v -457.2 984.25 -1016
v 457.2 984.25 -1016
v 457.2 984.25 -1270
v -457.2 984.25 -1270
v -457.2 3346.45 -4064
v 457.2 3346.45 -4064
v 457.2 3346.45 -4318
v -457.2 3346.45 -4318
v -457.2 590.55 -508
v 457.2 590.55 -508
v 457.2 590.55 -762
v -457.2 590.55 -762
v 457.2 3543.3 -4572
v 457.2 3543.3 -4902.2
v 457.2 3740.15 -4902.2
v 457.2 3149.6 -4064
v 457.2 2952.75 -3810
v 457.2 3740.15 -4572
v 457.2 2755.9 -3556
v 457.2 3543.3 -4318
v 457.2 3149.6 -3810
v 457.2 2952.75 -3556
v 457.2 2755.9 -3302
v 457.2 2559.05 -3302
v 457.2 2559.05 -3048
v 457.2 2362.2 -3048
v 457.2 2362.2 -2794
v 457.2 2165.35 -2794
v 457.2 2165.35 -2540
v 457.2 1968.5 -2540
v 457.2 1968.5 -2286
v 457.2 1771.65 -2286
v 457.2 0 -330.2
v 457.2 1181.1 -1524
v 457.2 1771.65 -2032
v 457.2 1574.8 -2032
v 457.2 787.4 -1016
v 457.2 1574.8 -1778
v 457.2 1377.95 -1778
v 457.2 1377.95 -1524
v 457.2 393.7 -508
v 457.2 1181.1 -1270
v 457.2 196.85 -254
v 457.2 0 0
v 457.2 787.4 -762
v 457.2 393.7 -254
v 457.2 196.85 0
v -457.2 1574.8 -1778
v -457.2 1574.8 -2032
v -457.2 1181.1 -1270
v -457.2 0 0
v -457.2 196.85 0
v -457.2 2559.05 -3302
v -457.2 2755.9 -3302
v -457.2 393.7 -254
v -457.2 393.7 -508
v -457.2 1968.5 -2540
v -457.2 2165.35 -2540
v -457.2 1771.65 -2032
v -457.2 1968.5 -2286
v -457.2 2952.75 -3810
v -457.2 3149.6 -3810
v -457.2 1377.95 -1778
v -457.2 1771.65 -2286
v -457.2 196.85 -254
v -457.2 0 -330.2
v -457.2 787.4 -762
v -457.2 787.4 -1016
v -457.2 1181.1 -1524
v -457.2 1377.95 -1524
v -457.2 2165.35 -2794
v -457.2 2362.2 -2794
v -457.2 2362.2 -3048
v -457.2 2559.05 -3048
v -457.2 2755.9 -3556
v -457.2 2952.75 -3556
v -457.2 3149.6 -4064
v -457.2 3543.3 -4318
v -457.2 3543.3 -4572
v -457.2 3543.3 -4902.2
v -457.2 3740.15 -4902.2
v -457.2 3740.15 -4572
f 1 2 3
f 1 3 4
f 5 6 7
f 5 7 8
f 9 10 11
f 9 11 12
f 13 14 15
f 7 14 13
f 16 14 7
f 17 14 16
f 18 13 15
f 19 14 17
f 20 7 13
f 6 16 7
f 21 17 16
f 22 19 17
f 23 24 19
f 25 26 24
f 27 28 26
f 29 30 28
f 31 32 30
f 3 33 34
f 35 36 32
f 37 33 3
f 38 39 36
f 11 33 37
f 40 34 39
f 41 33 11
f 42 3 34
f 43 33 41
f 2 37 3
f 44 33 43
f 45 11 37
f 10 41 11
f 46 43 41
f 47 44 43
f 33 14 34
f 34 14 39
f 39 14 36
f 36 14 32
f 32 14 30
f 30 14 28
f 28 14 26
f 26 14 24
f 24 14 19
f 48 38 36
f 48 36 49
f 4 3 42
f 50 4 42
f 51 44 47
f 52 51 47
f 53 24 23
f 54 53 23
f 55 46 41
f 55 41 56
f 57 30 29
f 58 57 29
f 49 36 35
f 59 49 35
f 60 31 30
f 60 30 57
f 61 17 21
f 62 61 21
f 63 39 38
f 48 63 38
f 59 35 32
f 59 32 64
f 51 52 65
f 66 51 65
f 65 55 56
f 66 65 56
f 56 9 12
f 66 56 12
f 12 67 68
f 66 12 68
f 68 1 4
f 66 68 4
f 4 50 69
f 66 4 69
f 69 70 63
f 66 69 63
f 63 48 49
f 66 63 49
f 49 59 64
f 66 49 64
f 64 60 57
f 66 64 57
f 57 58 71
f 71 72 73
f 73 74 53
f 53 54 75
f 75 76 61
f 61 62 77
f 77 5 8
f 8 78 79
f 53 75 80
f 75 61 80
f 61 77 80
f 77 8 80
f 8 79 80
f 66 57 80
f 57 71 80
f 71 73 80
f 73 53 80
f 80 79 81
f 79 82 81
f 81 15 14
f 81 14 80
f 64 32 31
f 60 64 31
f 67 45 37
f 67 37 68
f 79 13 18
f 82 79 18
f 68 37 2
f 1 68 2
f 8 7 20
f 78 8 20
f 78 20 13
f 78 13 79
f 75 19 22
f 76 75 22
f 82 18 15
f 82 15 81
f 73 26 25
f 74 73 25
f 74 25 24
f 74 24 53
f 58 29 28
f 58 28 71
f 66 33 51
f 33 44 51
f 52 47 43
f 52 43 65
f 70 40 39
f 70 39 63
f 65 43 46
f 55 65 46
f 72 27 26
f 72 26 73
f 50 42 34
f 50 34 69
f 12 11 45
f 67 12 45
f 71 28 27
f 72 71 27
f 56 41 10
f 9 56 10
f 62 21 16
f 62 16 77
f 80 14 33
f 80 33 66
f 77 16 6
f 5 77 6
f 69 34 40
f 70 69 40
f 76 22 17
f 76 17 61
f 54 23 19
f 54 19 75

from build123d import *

# Parameters (mm, degrees)
SKETCH1_W                  = 254
SKETCH1_H                  = 196.85
MODELSTEP_DEPTH            = 457.2
SKETCH4_W                  = 914.4
SKETCH4_H                  = 196.85
EXTRUDEMAXSTAIRWIDTH_DEPTH = 76.2
PATTERN_STAIRS_COUNT       = 19
PATTERN_STAIRS_PITCH       = 321.350155594
COMBINESTAIRS_START        = -155.593203
SKETCH5_W                  = 914.4
SKETCH5_H                  = 5784.302800684
COMBINESTAIRS_DEPTH        = 155.593203


with BuildPart() as part:
    # Sketch1 → ModelStep (new body, symmetric)
    with BuildSketch(Plane(origin=(0, 0, 0), x_dir=(0, 0, -1), z_dir=(1, 0, 0))):
        with Locations((127, 98.425)):
            Rectangle(SKETCH1_W, SKETCH1_H)
    extrude(amount=MODELSTEP_DEPTH, both=True)

    # Sketch4 → ExtrudeMaxStairWidth (add)
    with BuildSketch(Plane(origin=(0, 0, -254), x_dir=(-1, 0, 0), z_dir=(0, 0, -1))):
        with Locations((0, 98.425)):
            Rectangle(SKETCH4_W, SKETCH4_H)
    extrude(amount=EXTRUDEMAXSTAIRWIDTH_DEPTH)


with BuildPart() as pattern_stairs_1:
    # Pattern stairs: pattern copy
    add(part.part.moved(Location(Vector(0, 0.612571665, -0.790415052) * (1 * PATTERN_STAIRS_PITCH))))


with BuildPart() as pattern_stairs_2:
    # Pattern stairs: pattern copy
    add(part.part.moved(Location(Vector(0, 0.612571665, -0.790415052) * (2 * PATTERN_STAIRS_PITCH))))


with BuildPart() as pattern_stairs_3:
    # Pattern stairs: pattern copy
    add(part.part.moved(Location(Vector(0, 0.612571665, -0.790415052) * (3 * PATTERN_STAIRS_PITCH))))


with BuildPart() as pattern_stairs_4:
    # Pattern stairs: pattern copy
    add(part.part.moved(Location(Vector(0, 0.612571665, -0.790415052) * (4 * PATTERN_STAIRS_PITCH))))


with BuildPart() as pattern_stairs_5:
    # Pattern stairs: pattern copy
    add(part.part.moved(Location(Vector(0, 0.612571665, -0.790415052) * (5 * PATTERN_STAIRS_PITCH))))


with BuildPart() as pattern_stairs_6:
    # Pattern stairs: pattern copy
    add(part.part.moved(Location(Vector(0, 0.612571665, -0.790415052) * (6 * PATTERN_STAIRS_PITCH))))


with BuildPart() as pattern_stairs_7:
    # Pattern stairs: pattern copy
    add(part.part.moved(Location(Vector(0, 0.612571665, -0.790415052) * (7 * PATTERN_STAIRS_PITCH))))


with BuildPart() as pattern_stairs_8:
    # Pattern stairs: pattern copy
    add(part.part.moved(Location(Vector(0, 0.612571665, -0.790415052) * (8 * PATTERN_STAIRS_PITCH))))


with BuildPart() as pattern_stairs_9:
    # Pattern stairs: pattern copy
    add(part.part.moved(Location(Vector(0, 0.612571665, -0.790415052) * (9 * PATTERN_STAIRS_PITCH))))


with BuildPart() as pattern_stairs_10:
    # Pattern stairs: pattern copy
    add(part.part.moved(Location(Vector(0, 0.612571665, -0.790415052) * (10 * PATTERN_STAIRS_PITCH))))


with BuildPart() as pattern_stairs_11:
    # Pattern stairs: pattern copy
    add(part.part.moved(Location(Vector(0, 0.612571665, -0.790415052) * (11 * PATTERN_STAIRS_PITCH))))


with BuildPart() as pattern_stairs_12:
    # Pattern stairs: pattern copy
    add(part.part.moved(Location(Vector(0, 0.612571665, -0.790415052) * (12 * PATTERN_STAIRS_PITCH))))


with BuildPart() as pattern_stairs_13:
    # Pattern stairs: pattern copy
    add(part.part.moved(Location(Vector(0, 0.612571665, -0.790415052) * (13 * PATTERN_STAIRS_PITCH))))


with BuildPart() as pattern_stairs_14:
    # Pattern stairs: pattern copy
    add(part.part.moved(Location(Vector(0, 0.612571665, -0.790415052) * (14 * PATTERN_STAIRS_PITCH))))


with BuildPart() as pattern_stairs_15:
    # Pattern stairs: pattern copy
    add(part.part.moved(Location(Vector(0, 0.612571665, -0.790415052) * (15 * PATTERN_STAIRS_PITCH))))


with BuildPart() as pattern_stairs_16:
    # Pattern stairs: pattern copy
    add(part.part.moved(Location(Vector(0, 0.612571665, -0.790415052) * (16 * PATTERN_STAIRS_PITCH))))


with BuildPart() as pattern_stairs_17:
    # Pattern stairs: pattern copy
    add(part.part.moved(Location(Vector(0, 0.612571665, -0.790415052) * (17 * PATTERN_STAIRS_PITCH))))


with BuildPart() as pattern_stairs_18:
    # Pattern stairs: pattern copy
    add(part.part.moved(Location(Vector(0, 0.612571665, -0.790415052) * (18 * PATTERN_STAIRS_PITCH))))


with BuildPart() as part_1:
    add(part.part)

    add(pattern_stairs_1.part)  # CombineStairs merges Pattern stairs_1

    add(pattern_stairs_2.part)  # CombineStairs merges Pattern stairs_2

    add(pattern_stairs_3.part)  # CombineStairs merges Pattern stairs_3

    add(pattern_stairs_4.part)  # CombineStairs merges Pattern stairs_4

    add(pattern_stairs_5.part)  # CombineStairs merges Pattern stairs_5

    add(pattern_stairs_6.part)  # CombineStairs merges Pattern stairs_6

    add(pattern_stairs_7.part)  # CombineStairs merges Pattern stairs_7

    add(pattern_stairs_8.part)  # CombineStairs merges Pattern stairs_8

    add(pattern_stairs_9.part)  # CombineStairs merges Pattern stairs_9

    add(pattern_stairs_10.part)  # CombineStairs merges Pattern stairs_10

    add(pattern_stairs_11.part)  # CombineStairs merges Pattern stairs_11

    add(pattern_stairs_12.part)  # CombineStairs merges Pattern stairs_12

    add(pattern_stairs_13.part)  # CombineStairs merges Pattern stairs_13

    add(pattern_stairs_14.part)  # CombineStairs merges Pattern stairs_14

    add(pattern_stairs_15.part)  # CombineStairs merges Pattern stairs_15

    add(pattern_stairs_16.part)  # CombineStairs merges Pattern stairs_16

    add(pattern_stairs_17.part)  # CombineStairs merges Pattern stairs_17

    add(pattern_stairs_18.part)  # CombineStairs merges Pattern stairs_18
    # Sketch5 → CombineStairs (add)
    with BuildSketch(Plane(origin=(0, -159.878172589, -123.905583756), x_dir=(-1, 0, 0), z_dir=(0, -0.790415052, -0.612571665)).offset(COMBINESTAIRS_START)):
        with Locations((0, 3153.14645057)):
            Rectangle(SKETCH5_W, SKETCH5_H)
    extrude(amount=COMBINESTAIRS_DEPTH)


solid = part_1.part
